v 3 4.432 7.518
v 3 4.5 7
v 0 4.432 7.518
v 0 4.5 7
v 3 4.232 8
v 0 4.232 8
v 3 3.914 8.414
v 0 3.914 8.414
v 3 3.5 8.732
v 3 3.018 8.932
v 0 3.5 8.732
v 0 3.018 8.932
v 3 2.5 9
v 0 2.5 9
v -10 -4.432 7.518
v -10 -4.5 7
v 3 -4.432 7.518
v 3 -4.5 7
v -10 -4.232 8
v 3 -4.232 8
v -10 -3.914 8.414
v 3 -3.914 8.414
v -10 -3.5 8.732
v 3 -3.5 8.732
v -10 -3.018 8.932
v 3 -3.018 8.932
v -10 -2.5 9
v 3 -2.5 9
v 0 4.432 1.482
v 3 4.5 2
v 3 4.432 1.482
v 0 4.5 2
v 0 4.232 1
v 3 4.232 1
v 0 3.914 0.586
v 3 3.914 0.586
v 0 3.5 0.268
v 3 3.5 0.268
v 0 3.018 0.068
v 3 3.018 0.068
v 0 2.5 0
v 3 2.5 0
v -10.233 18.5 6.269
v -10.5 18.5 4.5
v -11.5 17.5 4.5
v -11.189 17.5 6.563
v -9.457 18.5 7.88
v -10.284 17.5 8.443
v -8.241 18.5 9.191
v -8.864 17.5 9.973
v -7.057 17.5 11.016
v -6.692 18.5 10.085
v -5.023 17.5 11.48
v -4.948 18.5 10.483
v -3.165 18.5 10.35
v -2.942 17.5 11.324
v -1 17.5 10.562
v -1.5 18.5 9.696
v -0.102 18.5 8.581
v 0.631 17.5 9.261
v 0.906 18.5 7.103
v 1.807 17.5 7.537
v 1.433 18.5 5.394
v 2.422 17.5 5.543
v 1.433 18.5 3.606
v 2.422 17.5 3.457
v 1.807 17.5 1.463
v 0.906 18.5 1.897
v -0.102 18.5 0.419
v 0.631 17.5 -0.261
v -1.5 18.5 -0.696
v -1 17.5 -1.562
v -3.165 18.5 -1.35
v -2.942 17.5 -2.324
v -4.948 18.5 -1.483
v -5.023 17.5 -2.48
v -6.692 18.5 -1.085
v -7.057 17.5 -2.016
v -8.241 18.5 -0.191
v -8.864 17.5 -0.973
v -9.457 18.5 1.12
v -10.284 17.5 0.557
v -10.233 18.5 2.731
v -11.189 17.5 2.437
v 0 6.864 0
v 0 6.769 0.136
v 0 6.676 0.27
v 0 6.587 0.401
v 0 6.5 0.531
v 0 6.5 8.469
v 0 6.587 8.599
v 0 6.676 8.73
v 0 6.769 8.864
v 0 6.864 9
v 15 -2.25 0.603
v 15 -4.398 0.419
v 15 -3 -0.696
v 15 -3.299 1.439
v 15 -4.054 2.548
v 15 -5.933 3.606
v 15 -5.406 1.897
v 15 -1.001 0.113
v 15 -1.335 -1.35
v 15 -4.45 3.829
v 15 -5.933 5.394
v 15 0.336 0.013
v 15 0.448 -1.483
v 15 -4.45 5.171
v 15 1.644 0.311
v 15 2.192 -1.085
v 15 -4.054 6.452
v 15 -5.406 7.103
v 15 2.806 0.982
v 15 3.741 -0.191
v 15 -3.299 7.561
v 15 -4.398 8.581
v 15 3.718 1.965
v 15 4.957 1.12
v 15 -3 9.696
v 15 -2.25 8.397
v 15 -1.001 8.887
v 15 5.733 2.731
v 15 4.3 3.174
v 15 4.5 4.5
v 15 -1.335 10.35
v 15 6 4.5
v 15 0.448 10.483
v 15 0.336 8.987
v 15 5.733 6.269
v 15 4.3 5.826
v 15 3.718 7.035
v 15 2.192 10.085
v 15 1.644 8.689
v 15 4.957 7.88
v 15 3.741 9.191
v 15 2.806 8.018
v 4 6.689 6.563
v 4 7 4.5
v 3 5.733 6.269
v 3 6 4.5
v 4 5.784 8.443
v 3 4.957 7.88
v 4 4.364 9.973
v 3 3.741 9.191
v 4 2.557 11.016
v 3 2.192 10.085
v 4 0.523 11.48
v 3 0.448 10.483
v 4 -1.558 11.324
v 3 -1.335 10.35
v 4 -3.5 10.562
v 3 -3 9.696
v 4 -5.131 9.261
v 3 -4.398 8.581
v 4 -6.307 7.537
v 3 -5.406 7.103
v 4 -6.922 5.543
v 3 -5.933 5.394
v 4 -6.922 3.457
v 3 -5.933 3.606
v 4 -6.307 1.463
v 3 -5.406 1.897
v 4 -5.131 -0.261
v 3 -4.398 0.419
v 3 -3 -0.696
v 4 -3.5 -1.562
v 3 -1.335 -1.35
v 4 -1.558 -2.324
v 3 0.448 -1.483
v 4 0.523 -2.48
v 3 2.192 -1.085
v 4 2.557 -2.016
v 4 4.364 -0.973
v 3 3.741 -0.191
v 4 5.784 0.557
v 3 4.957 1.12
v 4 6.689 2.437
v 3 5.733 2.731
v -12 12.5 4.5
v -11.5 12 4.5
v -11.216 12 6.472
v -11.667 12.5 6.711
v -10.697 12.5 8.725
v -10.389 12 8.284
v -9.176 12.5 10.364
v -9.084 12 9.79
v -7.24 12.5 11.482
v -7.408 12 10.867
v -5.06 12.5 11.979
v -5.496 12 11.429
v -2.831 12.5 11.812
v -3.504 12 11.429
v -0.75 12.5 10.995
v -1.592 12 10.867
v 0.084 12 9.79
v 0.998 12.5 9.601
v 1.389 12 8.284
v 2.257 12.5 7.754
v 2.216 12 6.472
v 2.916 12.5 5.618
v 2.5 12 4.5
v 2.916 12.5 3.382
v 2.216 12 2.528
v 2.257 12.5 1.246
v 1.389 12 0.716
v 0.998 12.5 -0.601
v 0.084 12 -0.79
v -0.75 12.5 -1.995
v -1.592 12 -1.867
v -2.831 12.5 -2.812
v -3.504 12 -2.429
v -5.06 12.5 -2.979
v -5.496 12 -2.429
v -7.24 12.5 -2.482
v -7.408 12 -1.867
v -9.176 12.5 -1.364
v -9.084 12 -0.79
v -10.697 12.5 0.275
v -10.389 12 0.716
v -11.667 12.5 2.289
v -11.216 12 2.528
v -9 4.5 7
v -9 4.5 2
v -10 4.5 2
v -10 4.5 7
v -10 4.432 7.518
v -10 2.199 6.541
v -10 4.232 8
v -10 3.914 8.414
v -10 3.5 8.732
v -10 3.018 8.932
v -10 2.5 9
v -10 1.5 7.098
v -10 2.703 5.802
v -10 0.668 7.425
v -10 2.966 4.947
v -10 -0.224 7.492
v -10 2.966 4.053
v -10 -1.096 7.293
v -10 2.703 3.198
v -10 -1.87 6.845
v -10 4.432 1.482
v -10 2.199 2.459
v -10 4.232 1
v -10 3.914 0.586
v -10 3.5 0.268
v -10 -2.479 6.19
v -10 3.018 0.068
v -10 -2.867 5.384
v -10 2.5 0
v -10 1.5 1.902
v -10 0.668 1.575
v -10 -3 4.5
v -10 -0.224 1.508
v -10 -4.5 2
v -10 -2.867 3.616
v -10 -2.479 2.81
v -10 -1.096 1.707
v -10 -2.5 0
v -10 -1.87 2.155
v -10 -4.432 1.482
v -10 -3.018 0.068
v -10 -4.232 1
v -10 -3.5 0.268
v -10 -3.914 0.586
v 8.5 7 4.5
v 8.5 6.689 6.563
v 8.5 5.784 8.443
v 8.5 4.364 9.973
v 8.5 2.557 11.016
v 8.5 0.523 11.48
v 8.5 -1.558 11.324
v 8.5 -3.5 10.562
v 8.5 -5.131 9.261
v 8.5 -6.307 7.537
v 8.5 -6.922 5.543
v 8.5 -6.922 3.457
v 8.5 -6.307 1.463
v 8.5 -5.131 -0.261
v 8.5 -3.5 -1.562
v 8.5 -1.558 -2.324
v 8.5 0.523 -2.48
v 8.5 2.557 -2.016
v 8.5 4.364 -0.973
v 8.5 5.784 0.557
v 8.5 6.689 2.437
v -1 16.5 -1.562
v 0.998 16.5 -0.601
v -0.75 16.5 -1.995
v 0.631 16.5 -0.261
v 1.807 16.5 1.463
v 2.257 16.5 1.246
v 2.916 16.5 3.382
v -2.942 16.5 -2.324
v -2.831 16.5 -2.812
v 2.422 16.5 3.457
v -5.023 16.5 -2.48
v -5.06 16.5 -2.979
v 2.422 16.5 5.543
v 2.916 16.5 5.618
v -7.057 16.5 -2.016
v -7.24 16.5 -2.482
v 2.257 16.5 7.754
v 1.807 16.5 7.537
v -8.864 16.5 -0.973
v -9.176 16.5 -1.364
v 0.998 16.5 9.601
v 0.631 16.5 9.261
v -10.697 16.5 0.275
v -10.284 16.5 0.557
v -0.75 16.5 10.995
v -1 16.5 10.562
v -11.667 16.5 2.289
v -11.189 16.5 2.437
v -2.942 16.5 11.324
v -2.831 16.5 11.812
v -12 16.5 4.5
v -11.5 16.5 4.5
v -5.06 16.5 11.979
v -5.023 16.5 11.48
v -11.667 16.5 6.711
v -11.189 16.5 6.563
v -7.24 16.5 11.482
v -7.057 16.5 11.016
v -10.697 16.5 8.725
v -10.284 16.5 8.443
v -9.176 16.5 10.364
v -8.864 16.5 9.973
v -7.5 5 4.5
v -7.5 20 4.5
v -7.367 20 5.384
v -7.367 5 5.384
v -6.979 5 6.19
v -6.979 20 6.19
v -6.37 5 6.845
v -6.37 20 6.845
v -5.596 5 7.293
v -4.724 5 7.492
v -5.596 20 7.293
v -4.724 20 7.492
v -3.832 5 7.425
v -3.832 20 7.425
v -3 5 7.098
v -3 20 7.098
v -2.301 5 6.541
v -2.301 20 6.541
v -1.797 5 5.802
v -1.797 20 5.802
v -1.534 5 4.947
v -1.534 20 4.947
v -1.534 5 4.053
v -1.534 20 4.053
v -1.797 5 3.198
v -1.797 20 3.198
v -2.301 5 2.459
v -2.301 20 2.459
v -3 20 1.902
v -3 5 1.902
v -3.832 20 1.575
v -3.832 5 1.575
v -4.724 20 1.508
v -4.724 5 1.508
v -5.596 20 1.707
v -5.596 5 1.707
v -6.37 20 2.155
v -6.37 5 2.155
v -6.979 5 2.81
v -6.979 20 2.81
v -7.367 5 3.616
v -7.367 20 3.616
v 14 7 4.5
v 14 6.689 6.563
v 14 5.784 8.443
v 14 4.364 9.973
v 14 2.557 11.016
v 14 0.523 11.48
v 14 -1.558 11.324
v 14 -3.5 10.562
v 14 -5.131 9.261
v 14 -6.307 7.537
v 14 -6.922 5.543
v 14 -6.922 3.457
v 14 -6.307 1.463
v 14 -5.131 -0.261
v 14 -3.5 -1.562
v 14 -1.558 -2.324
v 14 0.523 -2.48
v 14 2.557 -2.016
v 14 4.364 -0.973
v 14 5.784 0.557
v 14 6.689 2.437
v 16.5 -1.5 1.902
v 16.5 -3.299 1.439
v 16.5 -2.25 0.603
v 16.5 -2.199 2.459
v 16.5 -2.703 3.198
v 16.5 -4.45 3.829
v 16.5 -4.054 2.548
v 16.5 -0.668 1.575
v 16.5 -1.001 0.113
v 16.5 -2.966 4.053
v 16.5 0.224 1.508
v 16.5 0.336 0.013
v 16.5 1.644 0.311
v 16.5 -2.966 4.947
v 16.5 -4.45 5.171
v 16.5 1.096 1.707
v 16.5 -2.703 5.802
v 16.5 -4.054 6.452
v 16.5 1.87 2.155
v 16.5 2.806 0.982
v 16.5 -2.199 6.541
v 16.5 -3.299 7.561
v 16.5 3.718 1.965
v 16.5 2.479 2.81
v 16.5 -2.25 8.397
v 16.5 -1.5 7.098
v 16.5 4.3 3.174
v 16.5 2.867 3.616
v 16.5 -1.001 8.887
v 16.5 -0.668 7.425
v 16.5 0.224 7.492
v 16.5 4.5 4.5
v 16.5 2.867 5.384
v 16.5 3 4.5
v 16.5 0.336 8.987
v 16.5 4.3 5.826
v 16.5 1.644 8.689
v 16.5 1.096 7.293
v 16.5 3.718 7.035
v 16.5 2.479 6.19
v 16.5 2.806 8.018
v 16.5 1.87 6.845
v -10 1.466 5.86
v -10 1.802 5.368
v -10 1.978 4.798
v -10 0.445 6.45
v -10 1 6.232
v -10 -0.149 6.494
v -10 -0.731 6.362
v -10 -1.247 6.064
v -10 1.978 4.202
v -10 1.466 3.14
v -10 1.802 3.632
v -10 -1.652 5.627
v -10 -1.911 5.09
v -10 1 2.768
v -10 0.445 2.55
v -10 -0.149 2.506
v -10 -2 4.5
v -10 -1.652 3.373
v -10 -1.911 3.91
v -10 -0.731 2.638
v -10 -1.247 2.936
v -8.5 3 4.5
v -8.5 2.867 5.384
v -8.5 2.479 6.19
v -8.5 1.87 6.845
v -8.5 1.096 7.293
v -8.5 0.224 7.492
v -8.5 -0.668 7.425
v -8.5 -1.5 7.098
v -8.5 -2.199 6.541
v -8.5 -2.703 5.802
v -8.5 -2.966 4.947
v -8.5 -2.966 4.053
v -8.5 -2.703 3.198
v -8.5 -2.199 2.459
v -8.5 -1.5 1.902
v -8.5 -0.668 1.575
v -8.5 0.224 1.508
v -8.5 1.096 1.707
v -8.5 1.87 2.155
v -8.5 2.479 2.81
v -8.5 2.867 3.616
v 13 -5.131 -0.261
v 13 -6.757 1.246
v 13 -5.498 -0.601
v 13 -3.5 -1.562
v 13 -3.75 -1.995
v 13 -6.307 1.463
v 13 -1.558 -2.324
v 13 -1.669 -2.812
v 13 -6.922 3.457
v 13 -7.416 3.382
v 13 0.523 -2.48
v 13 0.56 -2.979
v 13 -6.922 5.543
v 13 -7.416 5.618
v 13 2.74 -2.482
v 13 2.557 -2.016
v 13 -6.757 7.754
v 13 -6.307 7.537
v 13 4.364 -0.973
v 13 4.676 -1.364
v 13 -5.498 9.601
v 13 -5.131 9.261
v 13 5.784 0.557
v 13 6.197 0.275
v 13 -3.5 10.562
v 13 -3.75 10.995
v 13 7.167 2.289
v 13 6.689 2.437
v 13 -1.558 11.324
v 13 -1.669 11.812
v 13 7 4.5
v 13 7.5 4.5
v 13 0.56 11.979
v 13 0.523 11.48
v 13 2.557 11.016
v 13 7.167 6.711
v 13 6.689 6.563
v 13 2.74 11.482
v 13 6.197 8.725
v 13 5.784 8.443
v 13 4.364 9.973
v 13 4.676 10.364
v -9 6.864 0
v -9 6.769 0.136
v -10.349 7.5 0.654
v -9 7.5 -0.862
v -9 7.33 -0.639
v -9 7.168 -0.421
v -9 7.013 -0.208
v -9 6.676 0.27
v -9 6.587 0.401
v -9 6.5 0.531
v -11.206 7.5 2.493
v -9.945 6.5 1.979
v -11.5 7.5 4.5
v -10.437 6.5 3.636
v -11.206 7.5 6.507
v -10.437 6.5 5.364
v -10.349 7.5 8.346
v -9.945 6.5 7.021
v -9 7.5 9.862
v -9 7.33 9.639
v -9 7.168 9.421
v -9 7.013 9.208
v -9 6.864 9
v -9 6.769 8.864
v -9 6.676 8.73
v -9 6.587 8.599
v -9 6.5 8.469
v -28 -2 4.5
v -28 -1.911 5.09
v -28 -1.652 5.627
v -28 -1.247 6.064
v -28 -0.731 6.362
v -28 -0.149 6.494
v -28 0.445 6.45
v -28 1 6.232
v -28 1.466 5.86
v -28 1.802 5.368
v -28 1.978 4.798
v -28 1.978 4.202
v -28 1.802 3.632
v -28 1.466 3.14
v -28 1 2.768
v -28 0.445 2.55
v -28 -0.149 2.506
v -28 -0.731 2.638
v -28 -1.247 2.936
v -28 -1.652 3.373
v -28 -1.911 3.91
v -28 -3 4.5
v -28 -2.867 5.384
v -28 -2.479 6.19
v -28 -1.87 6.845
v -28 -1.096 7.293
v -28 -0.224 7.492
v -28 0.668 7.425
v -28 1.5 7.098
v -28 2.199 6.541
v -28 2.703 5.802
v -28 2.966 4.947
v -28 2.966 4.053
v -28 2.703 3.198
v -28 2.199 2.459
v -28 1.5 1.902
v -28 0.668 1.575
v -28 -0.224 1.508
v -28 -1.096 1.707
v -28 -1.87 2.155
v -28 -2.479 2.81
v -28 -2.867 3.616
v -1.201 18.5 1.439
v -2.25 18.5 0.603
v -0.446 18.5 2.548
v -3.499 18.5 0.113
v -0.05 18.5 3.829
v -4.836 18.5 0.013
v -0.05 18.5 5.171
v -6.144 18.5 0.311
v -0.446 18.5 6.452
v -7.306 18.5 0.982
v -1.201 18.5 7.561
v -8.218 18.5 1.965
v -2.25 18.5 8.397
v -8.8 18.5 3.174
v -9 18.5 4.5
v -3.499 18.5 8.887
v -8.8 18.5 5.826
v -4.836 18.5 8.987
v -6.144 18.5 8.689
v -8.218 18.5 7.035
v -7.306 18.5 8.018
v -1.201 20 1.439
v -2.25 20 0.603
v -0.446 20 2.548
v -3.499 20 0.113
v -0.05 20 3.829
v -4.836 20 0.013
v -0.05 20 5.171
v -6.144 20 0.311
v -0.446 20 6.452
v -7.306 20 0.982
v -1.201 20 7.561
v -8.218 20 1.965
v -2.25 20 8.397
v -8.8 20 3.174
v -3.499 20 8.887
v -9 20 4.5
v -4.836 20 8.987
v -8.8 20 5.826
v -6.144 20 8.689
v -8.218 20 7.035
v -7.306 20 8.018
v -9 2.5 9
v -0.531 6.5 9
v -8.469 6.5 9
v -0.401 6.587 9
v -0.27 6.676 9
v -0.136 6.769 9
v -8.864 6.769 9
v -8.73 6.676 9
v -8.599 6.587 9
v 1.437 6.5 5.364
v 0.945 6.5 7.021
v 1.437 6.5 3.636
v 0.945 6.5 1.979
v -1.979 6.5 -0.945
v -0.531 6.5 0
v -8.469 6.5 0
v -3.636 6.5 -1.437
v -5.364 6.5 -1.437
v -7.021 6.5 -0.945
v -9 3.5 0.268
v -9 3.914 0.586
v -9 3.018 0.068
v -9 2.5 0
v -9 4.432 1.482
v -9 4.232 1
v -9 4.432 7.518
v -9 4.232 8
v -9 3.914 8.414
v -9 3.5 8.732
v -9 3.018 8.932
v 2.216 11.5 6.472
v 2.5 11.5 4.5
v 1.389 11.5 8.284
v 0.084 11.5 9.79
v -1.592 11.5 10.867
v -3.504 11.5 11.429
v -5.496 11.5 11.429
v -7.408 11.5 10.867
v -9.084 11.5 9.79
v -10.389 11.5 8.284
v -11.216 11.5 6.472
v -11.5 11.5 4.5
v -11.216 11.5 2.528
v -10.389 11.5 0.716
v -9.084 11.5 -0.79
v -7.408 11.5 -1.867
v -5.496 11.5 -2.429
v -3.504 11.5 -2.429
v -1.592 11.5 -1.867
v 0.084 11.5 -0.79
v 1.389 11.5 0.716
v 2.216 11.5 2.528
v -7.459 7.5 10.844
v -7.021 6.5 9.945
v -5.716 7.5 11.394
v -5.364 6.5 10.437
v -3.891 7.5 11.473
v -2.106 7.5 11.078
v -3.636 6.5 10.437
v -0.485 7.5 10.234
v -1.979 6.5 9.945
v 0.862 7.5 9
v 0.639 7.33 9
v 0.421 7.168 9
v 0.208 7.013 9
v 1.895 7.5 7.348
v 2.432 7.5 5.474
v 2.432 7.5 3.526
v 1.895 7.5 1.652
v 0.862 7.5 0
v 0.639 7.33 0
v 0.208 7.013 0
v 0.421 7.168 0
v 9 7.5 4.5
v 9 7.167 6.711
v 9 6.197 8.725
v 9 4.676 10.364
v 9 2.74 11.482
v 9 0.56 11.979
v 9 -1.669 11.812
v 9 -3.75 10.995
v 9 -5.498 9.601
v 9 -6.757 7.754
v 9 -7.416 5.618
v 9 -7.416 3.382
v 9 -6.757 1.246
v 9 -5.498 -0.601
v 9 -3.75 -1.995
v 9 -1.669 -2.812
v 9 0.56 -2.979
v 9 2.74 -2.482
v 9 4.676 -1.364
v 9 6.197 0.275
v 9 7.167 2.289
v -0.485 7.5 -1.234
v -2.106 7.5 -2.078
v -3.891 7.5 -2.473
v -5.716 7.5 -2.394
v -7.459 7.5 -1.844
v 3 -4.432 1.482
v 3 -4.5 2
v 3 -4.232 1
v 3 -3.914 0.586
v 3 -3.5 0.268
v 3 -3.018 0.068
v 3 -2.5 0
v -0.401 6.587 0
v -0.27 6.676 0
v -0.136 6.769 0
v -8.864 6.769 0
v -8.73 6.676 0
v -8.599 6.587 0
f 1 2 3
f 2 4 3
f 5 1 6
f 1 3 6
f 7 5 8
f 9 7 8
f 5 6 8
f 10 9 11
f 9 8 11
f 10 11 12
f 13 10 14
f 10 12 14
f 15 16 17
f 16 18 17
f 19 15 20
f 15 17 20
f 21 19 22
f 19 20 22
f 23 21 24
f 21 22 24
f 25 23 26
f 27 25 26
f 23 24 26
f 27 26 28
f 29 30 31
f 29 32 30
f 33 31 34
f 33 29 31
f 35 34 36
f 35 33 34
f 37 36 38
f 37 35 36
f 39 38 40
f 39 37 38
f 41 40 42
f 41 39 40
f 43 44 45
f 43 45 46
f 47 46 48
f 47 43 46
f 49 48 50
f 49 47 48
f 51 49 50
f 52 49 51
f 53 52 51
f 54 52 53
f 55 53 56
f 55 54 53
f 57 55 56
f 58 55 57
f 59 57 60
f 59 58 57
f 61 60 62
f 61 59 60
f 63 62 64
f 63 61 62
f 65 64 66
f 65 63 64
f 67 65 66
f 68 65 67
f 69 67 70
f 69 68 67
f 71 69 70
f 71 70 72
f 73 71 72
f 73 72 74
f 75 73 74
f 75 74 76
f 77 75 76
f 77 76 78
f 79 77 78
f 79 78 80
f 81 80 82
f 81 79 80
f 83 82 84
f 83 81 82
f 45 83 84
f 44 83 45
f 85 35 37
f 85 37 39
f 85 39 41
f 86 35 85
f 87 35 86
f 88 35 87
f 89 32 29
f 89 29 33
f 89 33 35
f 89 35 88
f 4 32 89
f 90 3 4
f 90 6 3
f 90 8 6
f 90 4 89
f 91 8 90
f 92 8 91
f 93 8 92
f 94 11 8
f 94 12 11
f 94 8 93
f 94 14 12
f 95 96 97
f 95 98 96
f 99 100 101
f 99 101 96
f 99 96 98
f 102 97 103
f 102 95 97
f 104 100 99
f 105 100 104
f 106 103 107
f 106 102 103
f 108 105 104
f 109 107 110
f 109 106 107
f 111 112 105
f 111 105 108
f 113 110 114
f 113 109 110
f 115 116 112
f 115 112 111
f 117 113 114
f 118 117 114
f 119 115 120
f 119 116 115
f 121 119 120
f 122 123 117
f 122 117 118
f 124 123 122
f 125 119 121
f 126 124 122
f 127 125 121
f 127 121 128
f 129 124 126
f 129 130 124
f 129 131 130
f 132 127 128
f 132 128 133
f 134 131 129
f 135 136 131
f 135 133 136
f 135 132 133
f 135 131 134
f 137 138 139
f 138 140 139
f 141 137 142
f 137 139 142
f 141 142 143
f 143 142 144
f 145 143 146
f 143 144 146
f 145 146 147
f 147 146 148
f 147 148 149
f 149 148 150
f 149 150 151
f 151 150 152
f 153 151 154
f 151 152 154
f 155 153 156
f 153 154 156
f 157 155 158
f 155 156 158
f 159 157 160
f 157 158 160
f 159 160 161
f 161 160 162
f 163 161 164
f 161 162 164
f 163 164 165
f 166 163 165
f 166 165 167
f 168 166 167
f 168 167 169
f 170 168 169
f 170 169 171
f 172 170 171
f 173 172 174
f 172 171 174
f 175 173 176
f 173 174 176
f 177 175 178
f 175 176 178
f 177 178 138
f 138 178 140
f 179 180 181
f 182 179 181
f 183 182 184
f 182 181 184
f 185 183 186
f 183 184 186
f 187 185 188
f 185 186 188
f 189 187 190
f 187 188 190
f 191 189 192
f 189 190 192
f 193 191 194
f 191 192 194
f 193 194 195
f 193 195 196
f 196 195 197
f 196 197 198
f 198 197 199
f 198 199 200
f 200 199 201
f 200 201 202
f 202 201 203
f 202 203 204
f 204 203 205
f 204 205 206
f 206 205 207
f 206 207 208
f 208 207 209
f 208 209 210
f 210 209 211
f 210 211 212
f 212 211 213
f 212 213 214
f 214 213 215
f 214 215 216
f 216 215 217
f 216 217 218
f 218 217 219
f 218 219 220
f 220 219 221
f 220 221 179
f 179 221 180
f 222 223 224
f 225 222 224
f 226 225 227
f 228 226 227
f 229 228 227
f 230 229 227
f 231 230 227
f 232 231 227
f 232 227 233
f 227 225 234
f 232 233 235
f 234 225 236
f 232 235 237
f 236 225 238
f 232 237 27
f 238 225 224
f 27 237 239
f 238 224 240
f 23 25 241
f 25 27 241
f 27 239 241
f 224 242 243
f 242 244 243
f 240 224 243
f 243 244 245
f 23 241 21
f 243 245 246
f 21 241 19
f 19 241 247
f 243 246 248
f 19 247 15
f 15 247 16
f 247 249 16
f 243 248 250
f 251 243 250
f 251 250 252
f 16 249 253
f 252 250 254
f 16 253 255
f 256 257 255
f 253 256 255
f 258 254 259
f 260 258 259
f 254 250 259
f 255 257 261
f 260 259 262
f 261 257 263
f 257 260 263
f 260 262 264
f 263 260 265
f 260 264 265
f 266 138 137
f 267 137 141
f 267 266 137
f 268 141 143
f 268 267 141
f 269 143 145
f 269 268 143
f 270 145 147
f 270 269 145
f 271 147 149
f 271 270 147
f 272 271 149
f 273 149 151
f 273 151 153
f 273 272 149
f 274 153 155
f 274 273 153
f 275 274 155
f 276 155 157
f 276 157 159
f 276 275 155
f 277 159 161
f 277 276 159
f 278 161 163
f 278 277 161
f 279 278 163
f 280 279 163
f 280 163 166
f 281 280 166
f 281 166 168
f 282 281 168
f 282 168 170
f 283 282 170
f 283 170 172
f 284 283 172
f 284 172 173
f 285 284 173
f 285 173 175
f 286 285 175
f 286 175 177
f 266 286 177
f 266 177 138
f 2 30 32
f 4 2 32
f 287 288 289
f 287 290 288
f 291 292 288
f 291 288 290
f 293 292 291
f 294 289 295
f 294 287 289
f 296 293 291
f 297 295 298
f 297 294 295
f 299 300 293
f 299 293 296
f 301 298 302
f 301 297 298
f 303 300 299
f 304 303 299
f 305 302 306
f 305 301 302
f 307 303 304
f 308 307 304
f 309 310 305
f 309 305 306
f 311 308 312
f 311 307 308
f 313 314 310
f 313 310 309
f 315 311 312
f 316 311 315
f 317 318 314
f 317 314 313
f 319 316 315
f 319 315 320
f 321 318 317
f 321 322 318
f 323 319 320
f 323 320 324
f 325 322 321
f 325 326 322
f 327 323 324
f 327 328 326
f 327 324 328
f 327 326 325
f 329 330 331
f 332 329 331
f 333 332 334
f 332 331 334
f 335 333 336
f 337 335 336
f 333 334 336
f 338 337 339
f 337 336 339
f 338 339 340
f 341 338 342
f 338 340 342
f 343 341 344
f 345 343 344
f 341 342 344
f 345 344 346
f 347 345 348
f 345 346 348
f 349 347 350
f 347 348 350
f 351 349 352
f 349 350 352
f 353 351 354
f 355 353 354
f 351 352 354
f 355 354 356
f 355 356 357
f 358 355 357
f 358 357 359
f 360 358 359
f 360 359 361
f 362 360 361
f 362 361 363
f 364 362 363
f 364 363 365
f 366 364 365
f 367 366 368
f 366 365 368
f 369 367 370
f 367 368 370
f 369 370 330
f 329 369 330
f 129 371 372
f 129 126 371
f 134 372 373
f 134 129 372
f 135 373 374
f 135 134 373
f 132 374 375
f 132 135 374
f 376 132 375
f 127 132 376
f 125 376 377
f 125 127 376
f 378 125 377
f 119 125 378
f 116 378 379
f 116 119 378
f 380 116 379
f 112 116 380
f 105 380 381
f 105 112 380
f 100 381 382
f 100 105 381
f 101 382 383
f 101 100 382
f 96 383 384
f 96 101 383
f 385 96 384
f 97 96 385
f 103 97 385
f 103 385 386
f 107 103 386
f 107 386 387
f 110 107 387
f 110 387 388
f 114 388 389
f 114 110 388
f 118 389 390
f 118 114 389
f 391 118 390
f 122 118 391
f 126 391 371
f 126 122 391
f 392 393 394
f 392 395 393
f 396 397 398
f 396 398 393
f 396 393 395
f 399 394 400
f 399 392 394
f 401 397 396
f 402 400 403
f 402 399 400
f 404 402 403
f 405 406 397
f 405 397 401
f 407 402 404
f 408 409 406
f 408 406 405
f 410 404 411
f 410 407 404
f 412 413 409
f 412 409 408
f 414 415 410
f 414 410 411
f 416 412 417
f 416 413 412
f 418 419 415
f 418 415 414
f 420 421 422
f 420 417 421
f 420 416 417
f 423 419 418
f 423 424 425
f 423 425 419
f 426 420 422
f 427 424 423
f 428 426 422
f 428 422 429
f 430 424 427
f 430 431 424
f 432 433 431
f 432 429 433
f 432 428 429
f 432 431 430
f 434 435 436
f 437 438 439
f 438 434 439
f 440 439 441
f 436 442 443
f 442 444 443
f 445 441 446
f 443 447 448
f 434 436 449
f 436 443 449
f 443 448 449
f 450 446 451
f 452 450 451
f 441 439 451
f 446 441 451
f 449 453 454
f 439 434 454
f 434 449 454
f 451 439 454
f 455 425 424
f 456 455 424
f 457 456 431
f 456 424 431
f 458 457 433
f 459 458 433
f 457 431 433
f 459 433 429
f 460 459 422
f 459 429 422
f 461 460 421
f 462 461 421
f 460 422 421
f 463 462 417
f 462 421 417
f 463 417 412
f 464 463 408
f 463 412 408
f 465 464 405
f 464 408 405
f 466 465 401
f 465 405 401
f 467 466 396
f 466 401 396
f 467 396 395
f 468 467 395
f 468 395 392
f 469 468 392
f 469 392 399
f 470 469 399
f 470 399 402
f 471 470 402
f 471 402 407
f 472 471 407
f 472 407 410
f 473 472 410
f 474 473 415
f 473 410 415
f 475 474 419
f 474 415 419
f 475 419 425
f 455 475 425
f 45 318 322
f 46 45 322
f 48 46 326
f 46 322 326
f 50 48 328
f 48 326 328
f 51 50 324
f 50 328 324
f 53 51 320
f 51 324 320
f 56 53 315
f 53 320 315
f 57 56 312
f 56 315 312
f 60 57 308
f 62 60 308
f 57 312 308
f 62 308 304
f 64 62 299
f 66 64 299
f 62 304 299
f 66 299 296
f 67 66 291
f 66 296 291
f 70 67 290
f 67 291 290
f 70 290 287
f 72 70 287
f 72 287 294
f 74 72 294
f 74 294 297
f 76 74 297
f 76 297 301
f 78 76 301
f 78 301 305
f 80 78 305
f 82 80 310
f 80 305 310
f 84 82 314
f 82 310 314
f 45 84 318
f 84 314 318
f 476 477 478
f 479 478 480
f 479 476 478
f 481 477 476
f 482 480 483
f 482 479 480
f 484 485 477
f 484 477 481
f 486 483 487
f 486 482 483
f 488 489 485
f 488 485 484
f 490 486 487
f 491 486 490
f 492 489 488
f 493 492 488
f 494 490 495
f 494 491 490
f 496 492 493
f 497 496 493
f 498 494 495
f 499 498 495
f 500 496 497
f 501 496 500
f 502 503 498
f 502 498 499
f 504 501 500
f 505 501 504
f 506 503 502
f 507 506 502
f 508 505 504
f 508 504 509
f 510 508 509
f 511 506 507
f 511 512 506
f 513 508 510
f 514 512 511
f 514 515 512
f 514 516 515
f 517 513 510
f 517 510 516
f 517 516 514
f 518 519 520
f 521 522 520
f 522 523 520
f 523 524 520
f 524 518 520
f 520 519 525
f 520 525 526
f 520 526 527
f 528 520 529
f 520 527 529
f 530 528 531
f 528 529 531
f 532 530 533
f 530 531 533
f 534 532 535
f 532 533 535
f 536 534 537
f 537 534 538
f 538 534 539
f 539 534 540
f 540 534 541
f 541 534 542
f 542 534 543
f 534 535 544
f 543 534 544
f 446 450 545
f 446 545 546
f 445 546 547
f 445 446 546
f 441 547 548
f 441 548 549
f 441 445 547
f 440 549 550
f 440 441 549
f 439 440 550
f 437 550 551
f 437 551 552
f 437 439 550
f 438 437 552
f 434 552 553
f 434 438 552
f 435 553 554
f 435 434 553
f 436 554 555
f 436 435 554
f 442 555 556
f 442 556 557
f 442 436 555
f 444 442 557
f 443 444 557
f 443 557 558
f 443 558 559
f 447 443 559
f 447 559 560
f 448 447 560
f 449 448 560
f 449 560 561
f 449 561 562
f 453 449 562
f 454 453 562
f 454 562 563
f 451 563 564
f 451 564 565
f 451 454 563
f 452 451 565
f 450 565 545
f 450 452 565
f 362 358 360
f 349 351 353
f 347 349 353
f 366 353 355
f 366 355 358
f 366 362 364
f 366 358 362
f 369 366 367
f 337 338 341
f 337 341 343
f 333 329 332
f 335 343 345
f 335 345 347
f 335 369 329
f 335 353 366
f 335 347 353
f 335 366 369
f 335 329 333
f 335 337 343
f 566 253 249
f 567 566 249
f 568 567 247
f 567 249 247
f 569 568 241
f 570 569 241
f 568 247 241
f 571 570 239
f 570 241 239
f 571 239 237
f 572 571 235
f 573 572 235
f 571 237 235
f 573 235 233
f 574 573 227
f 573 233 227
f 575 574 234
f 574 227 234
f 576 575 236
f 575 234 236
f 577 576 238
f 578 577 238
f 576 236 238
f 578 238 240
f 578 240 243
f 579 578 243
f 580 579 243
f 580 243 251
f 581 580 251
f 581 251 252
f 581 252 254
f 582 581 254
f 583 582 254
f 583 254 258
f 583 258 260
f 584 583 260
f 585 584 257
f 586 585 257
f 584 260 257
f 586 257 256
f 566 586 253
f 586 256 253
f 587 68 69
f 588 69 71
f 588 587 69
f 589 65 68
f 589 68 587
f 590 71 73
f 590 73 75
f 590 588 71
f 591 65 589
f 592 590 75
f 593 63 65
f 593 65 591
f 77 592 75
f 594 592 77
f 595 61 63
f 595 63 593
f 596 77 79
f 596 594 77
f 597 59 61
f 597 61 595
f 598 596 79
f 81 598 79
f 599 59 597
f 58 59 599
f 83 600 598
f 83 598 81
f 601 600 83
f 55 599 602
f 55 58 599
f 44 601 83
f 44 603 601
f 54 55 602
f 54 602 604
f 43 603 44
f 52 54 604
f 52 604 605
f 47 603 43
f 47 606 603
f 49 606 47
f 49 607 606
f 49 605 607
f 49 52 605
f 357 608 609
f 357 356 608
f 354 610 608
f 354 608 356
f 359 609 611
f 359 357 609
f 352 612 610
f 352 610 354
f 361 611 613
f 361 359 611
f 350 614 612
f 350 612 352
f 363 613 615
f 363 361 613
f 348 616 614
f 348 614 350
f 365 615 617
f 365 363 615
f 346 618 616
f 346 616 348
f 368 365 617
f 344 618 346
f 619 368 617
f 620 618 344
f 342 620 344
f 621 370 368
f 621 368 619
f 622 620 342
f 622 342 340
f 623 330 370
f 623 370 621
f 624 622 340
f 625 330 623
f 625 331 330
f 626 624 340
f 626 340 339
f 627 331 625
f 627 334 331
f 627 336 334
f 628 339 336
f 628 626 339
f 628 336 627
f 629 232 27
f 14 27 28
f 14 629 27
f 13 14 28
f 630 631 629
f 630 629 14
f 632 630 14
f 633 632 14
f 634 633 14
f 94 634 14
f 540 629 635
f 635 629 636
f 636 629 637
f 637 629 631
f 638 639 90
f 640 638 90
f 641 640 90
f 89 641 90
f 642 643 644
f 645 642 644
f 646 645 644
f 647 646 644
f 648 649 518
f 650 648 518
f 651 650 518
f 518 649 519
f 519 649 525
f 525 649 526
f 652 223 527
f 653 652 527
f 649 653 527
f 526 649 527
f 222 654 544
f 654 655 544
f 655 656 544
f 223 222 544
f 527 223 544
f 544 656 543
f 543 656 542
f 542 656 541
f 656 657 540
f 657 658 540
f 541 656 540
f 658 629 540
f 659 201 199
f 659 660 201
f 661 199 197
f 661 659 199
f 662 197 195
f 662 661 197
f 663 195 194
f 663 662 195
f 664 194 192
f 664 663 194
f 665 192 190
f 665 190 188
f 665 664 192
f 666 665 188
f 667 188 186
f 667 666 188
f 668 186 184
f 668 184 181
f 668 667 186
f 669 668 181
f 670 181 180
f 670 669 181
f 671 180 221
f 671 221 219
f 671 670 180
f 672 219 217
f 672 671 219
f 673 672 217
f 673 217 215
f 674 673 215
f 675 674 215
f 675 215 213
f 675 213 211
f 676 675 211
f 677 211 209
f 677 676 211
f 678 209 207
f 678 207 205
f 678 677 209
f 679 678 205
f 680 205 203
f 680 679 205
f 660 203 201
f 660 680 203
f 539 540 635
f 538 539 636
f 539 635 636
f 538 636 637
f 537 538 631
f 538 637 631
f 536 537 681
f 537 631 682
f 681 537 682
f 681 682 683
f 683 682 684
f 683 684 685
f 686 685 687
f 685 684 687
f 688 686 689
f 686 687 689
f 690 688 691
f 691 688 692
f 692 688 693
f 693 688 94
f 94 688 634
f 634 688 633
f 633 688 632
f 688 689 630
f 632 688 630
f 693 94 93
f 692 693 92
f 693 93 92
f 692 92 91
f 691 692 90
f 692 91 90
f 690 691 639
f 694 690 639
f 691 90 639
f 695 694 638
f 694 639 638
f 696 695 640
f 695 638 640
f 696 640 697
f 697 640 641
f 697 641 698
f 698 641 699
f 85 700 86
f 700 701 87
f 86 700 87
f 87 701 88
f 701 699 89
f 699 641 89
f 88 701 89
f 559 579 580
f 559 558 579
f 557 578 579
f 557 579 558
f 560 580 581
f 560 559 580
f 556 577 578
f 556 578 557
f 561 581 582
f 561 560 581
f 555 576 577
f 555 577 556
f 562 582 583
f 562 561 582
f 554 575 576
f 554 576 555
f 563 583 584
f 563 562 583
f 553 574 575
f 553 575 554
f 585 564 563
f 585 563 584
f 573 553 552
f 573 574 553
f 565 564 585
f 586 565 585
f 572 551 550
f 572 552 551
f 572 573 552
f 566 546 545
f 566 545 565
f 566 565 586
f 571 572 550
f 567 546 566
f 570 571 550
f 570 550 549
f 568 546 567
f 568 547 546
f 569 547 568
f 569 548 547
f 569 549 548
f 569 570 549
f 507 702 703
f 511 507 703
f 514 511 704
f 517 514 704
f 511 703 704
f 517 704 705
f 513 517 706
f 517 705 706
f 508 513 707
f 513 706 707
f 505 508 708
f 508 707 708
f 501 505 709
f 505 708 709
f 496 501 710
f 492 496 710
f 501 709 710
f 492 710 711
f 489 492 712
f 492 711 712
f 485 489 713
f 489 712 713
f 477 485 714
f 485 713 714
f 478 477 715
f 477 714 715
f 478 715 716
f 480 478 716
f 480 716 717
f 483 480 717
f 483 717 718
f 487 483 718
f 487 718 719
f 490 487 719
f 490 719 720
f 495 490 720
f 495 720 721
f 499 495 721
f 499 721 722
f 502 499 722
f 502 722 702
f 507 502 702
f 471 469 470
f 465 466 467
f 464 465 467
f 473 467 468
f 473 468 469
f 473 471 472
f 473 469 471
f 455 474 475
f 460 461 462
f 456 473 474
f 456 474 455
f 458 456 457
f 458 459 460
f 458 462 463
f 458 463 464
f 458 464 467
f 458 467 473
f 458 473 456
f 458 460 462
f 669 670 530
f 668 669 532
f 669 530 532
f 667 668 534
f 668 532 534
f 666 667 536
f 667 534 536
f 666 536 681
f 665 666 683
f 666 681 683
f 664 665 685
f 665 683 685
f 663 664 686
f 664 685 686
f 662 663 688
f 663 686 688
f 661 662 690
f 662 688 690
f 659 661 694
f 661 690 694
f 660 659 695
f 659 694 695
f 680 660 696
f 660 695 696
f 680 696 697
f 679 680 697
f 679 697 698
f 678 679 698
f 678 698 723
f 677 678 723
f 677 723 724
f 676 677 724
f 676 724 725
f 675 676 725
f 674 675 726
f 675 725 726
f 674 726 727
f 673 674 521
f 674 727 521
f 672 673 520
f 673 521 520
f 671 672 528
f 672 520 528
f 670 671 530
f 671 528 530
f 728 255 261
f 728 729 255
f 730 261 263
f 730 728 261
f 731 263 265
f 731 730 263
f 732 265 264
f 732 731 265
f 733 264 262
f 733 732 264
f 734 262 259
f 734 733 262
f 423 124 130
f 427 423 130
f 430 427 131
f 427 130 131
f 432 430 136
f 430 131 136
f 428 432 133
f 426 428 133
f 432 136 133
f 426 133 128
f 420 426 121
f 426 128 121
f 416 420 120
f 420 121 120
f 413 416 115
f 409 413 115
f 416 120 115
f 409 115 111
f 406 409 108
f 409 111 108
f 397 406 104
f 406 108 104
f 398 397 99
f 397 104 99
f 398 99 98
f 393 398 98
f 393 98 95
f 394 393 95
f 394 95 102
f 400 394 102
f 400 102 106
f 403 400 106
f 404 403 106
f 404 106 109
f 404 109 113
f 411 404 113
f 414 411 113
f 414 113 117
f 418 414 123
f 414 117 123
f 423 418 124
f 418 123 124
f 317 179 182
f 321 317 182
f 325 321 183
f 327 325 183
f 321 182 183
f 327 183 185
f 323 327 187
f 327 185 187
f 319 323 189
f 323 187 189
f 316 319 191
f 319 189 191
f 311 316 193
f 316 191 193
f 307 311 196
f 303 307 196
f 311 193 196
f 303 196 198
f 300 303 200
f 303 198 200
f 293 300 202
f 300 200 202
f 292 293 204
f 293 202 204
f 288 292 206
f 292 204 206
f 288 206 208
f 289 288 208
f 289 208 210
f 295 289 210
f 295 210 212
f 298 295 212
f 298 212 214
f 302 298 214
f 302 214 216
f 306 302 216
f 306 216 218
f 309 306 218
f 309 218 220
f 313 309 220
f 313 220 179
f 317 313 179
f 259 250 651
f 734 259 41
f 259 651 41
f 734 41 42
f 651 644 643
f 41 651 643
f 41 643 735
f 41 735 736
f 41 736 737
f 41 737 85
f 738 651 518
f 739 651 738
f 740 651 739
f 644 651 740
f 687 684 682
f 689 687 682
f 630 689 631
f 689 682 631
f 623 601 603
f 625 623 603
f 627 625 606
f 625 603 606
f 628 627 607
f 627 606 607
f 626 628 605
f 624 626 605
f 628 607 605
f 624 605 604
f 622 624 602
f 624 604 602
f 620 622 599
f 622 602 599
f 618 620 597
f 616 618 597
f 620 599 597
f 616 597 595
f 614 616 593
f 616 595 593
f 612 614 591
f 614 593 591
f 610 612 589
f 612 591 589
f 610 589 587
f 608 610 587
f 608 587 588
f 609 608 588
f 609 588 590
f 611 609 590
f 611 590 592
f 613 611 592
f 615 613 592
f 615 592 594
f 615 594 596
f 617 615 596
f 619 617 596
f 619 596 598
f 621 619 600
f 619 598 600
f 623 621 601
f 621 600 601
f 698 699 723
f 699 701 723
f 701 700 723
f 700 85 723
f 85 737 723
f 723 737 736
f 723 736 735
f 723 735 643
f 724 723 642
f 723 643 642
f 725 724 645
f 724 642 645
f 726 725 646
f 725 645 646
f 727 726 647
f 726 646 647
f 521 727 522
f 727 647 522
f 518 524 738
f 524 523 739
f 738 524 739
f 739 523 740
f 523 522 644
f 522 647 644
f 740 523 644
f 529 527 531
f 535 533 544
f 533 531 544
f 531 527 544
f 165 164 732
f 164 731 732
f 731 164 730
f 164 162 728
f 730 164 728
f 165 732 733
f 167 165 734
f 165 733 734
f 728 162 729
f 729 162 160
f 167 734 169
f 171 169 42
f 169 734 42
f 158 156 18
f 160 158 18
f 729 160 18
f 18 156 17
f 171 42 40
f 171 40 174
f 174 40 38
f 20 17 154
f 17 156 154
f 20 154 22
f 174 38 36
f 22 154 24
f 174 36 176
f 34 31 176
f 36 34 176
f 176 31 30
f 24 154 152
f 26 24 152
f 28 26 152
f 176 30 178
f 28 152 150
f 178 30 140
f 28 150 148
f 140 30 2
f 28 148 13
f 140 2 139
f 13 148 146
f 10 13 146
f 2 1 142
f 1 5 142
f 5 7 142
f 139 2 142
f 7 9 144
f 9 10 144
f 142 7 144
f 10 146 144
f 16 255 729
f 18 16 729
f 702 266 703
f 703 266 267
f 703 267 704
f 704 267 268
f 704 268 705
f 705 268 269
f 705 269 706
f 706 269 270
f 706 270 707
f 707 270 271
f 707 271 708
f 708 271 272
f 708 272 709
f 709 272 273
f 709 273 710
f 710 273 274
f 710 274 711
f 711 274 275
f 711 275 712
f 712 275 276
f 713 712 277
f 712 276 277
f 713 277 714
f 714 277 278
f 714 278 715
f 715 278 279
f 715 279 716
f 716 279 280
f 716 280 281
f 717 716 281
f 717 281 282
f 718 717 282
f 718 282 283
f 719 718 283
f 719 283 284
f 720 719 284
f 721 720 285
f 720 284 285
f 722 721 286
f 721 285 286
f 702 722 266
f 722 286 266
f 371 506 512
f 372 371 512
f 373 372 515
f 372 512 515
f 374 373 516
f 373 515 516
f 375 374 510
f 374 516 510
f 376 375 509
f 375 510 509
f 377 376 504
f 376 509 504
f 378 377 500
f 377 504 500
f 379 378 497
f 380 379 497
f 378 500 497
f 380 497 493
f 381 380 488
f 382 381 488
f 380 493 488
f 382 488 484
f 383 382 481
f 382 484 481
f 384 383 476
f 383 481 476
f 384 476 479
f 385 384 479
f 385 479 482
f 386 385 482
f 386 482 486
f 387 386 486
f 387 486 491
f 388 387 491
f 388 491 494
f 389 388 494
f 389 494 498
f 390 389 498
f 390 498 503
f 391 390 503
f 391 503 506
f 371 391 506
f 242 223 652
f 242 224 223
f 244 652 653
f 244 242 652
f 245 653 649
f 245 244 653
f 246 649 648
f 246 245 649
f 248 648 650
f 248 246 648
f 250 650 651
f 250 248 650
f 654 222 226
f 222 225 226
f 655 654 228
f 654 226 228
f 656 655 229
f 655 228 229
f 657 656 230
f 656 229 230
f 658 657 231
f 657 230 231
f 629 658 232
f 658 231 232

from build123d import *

# Parameters (mm, degrees)
F1_DEPTH     = 9
F2_R         = 2
F3_R         = 3
F3_R_2       = 2
F4_DEPTH     = 18
F5_R         = 7
F6_DEPTH     = 5
F8_R         = 7.5
F9_DEPTH     = 5
F10_S5_R     = 7
F10_T6_DEPTH = 12
F11_R        = 7
F12_DEPTH    = 2
F13_SIZE     = 1
F14_R        = 4.5
F15_DEPTH    = 1.5
F16_R        = 3
F17_DEPTH    = 15
F18_R        = 7
F19_DEPTH    = 5
F20_R        = 7.5
F21_DEPTH    = 5
F22_R        = 7
F23_DEPTH    = 2
F24_R        = 4.5
F25_DEPTH    = 1.5
F26_R        = 3
F27_DEPTH    = 25
F28_S7_R     = 7
F28_T8_DEPTH = 12


# Not quite as in the source:
# - a fillet or chamfer that OpenCascade refuses, or shapes differently, is made with other operations: its cross-section is extruded or revolved along the edge and cut away or added
# - a feature names something its author has since deleted; it is built from what else it names


with BuildPart() as f1:
    # F0 (on Top) → F1 (new body)
    with BuildSketch(Plane.XY):
        Polygon((-10, -4.5), (3, -4.5), (3, 4.5), (0, 4.5), (0, 6.5), (-9, 6.5), (-9, 4.5), (-10, 4.5), align=None)
    extrude(amount=F1_DEPTH)

    # F2
    f2_edges = [f1.edges().sort_by_distance(p)[0] for p in [
        (-3.5, -4.5, 9),
        (-3.5, -4.5, 0),
        (1.5, 4.5, 0),
        (1.5, 4.5, 9),
        (-9.5, 4.5, 9),
        (-9.5, 4.5, 0),
    ]]
    fillet(f2_edges, radius=F2_R)

    # F3 (on face) → F4 (join)
    with BuildSketch(Plane(origin=(-10, 0, 0), x_dir=(0, -1, 0), z_dir=(-1, 0, 0))):
        with Locations((0, 4.5)):
            Circle(F3_R)
        with Locations((0, 4.5)):
            Circle(F3_R_2, mode=Mode.SUBTRACT)
    extrude(amount=F4_DEPTH)

    # F5 (on face) → F6 (join)
    with BuildSketch(Plane(origin=(0, 6.5, 0), x_dir=(-1, 0, 0), z_dir=(0, 1, 0))):
        with Locations((4.5, 4.5)):
            Circle(F5_R)
    extrude(amount=F6_DEPTH)

    # F7: chamfer of 1 on 1 edges, made by hand


with BuildPart() as f7_tool2:
    # F7_s3 → F7_t4 (revolve)
    with BuildSketch(Plane.XY.offset(4.5)):
        Polygon((-11.5, 7.5), (-10.5, 6.5), (-11.5, 6.5), align=None)
    revolve(axis=Axis((-4.5, 6.5, 4.5), (0, 1, 0)))

    split(bisect_by=Plane.YZ.offset(-9), keep=Keep.BOTTOM)


with BuildPart() as f1_1:
    add(f1.part)

    # F7_t1: cut F7_tool2
    add(f7_tool2.part, mode=Mode.SUBTRACT)


with BuildPart() as f7_tool7:
    # F7_s8 → F7_t9 (revolve)
    with BuildSketch(Plane.XY.offset(4.5)):
        Polygon((-11.5, 7.5), (-10.5, 6.5), (-11.5, 6.5), align=None)
    revolve(axis=Axis((-4.5, 6.5, 4.5), (0, 1, 0)))

    split(bisect_by=Plane.XY.offset(9), keep=Keep.TOP)


with BuildPart() as f1_2:
    add(f1_1.part)

    # F7_t6: cut F7_tool7
    add(f7_tool7.part, mode=Mode.SUBTRACT)


with BuildPart() as f7_tool12:
    # F7_s13 → F7_t14 (revolve)
    with BuildSketch(Plane.XY.offset(4.5)):
        Polygon((-11.5, 7.5), (-10.5, 6.5), (-11.5, 6.5), align=None)
    revolve(axis=Axis((-4.5, 6.5, 4.5), (0, 1, 0)))

    split(bisect_by=Plane.XY, keep=Keep.BOTTOM)


with BuildPart() as f1_3:
    add(f1_2.part)

    # F7_t11: cut F7_tool12
    add(f7_tool12.part, mode=Mode.SUBTRACT)


with BuildPart() as f7_tool17:
    # F7_s18 → F7_t19 (revolve)
    with BuildSketch(Plane.XY.offset(4.5)):
        Polygon((-11.5, 7.5), (-10.5, 6.5), (-11.5, 6.5), align=None)
    revolve(axis=Axis((-4.5, 6.5, 4.5), (0, 1, 0)))

    split(bisect_by=Plane.YZ, keep=Keep.TOP)


with BuildPart() as f1_4:
    add(f1_3.part)

    # F7_t16: cut F7_tool17
    add(f7_tool17.part, mode=Mode.SUBTRACT)

    # F8 (on face) → F9 (join)
    with BuildSketch(Plane(origin=(0, 11.5, 0), x_dir=(-1, 0, 0), z_dir=(0, 1, 0))):
        with Locations((4.5, 4.5)):
            Circle(F8_R)
    extrude(amount=F9_DEPTH)

    # F10: chamfer of 1 on 1 edges, made by hand


with BuildPart() as f10_tool2:
    # F10_s3 → F10_t4 (revolve)
    with BuildSketch(Plane.XY.offset(4.5)):
        Polygon((-12, 12.5), (-11, 11.5), (-12, 11.5), align=None)
    revolve(axis=Axis((-4.5, 11.5, 4.5), (0, 1, 0)))

    # F10_s5 → F10_t6 (cut, symmetric)
    with BuildSketch(Plane.XZ.offset(-12)):
        with Locations((-4.5, 4.5)):
            Circle(F10_S5_R)
    extrude(amount=F10_T6_DEPTH, both=True, mode=Mode.SUBTRACT)


with BuildPart() as f1_5:
    add(f1_4.part)

    # F10_t1: cut F10_tool2
    add(f10_tool2.part, mode=Mode.SUBTRACT)

    # F11 (on face) → F12 (join)
    with BuildSketch(Plane(origin=(0, 16.5, 0), x_dir=(-1, 0, 0), z_dir=(0, 1, 0))):
        with Locations((4.5, 4.5)):
            Circle(F11_R)
    extrude(amount=F12_DEPTH)

    # F13
    f13_edges = [f1_5.edges().sort_by_distance(p)[0] for p in [
        (2.5, 18.5, 4.5),
    ]]
    chamfer(f13_edges, length=F13_SIZE)

    # F14 (on face) → F15 (join)
    with BuildSketch(Plane(origin=(0, 18.5, 0), x_dir=(-1, 0, 0), z_dir=(0, 1, 0))):
        with Locations((4.5, 4.5)):
            Circle(F14_R)
    extrude(amount=F15_DEPTH)

    # F16 (on face) → F17 (cut)
    with BuildSketch(Plane(origin=(0, 20, 0), x_dir=(-1, 0, 0), z_dir=(0, 1, 0))):
        with Locations((4.5, 4.5)):
            Circle(F16_R)
    extrude(amount=-F17_DEPTH, mode=Mode.SUBTRACT)

    # F18 (on face) → F19 (join)
    with BuildSketch(Plane.YZ.offset(3)):
        with Locations((0, 4.5)):
            Circle(F18_R)
    extrude(amount=F19_DEPTH)

    # F20 (on face) → F21 (join)
    with BuildSketch(Plane.YZ.offset(8)):
        with Locations((0, 4.5)):
            Circle(F20_R)
    extrude(amount=F21_DEPTH)

    # F22 (on face) → F23 (join)
    with BuildSketch(Plane.YZ.offset(13)):
        with Locations((0, 4.5)):
            Circle(F22_R)
    extrude(amount=F23_DEPTH)

    # F24 (on face) → F25 (join)
    with BuildSketch(Plane.YZ.offset(15)):
        with Locations((0, 4.5)):
            Circle(F24_R)
    extrude(amount=F25_DEPTH)

    # F26 (on face) → F27 (cut)
    with BuildSketch(Plane.YZ.offset(16.5)):
        with Locations((0, 4.5)):
            Circle(F26_R)
    extrude(amount=-F27_DEPTH, mode=Mode.SUBTRACT)

    # F28: chamfer of 1 on 3 edges, made by hand

    # F28_s1 → F28_t2 (revolve, cut)
    with BuildSketch(Plane.XY.offset(4.5)):
        Polygon((4, 7), (3, 6), (3, 7), align=None)
    revolve(axis=Axis((3, 0, 4.5), (1, 0, 0)), mode=Mode.SUBTRACT)


with BuildPart() as f28_tool4:
    # F28_s5 → F28_t6 (revolve)
    with BuildSketch(Plane.XY.offset(4.5)):
        Polygon((9, 7.5), (8, 6.5), (8, 7.5), align=None)
    revolve(axis=Axis((8, 0, 4.5), (1, 0, 0)))

    # F28_s7 → F28_t8 (cut, symmetric)
    with BuildSketch(Plane.YZ.offset(8.5)):
        with Locations((0, 4.5)):
            Circle(F28_S7_R)
    extrude(amount=F28_T8_DEPTH, both=True, mode=Mode.SUBTRACT)


with BuildPart() as f1_6:
    add(f1_5.part)

    # F28_t3: cut F28_tool4
    add(f28_tool4.part, mode=Mode.SUBTRACT)

    # F28_s9 → F28_t10 (revolve, cut)
    with BuildSketch(Plane.XY.offset(4.5)):
        Polygon((14, 7), (15, 6), (15, 7), align=None)
    revolve(axis=Axis((15, 0, 4.5), (1, 0, 0)), mode=Mode.SUBTRACT)


solid = f1_6.part
